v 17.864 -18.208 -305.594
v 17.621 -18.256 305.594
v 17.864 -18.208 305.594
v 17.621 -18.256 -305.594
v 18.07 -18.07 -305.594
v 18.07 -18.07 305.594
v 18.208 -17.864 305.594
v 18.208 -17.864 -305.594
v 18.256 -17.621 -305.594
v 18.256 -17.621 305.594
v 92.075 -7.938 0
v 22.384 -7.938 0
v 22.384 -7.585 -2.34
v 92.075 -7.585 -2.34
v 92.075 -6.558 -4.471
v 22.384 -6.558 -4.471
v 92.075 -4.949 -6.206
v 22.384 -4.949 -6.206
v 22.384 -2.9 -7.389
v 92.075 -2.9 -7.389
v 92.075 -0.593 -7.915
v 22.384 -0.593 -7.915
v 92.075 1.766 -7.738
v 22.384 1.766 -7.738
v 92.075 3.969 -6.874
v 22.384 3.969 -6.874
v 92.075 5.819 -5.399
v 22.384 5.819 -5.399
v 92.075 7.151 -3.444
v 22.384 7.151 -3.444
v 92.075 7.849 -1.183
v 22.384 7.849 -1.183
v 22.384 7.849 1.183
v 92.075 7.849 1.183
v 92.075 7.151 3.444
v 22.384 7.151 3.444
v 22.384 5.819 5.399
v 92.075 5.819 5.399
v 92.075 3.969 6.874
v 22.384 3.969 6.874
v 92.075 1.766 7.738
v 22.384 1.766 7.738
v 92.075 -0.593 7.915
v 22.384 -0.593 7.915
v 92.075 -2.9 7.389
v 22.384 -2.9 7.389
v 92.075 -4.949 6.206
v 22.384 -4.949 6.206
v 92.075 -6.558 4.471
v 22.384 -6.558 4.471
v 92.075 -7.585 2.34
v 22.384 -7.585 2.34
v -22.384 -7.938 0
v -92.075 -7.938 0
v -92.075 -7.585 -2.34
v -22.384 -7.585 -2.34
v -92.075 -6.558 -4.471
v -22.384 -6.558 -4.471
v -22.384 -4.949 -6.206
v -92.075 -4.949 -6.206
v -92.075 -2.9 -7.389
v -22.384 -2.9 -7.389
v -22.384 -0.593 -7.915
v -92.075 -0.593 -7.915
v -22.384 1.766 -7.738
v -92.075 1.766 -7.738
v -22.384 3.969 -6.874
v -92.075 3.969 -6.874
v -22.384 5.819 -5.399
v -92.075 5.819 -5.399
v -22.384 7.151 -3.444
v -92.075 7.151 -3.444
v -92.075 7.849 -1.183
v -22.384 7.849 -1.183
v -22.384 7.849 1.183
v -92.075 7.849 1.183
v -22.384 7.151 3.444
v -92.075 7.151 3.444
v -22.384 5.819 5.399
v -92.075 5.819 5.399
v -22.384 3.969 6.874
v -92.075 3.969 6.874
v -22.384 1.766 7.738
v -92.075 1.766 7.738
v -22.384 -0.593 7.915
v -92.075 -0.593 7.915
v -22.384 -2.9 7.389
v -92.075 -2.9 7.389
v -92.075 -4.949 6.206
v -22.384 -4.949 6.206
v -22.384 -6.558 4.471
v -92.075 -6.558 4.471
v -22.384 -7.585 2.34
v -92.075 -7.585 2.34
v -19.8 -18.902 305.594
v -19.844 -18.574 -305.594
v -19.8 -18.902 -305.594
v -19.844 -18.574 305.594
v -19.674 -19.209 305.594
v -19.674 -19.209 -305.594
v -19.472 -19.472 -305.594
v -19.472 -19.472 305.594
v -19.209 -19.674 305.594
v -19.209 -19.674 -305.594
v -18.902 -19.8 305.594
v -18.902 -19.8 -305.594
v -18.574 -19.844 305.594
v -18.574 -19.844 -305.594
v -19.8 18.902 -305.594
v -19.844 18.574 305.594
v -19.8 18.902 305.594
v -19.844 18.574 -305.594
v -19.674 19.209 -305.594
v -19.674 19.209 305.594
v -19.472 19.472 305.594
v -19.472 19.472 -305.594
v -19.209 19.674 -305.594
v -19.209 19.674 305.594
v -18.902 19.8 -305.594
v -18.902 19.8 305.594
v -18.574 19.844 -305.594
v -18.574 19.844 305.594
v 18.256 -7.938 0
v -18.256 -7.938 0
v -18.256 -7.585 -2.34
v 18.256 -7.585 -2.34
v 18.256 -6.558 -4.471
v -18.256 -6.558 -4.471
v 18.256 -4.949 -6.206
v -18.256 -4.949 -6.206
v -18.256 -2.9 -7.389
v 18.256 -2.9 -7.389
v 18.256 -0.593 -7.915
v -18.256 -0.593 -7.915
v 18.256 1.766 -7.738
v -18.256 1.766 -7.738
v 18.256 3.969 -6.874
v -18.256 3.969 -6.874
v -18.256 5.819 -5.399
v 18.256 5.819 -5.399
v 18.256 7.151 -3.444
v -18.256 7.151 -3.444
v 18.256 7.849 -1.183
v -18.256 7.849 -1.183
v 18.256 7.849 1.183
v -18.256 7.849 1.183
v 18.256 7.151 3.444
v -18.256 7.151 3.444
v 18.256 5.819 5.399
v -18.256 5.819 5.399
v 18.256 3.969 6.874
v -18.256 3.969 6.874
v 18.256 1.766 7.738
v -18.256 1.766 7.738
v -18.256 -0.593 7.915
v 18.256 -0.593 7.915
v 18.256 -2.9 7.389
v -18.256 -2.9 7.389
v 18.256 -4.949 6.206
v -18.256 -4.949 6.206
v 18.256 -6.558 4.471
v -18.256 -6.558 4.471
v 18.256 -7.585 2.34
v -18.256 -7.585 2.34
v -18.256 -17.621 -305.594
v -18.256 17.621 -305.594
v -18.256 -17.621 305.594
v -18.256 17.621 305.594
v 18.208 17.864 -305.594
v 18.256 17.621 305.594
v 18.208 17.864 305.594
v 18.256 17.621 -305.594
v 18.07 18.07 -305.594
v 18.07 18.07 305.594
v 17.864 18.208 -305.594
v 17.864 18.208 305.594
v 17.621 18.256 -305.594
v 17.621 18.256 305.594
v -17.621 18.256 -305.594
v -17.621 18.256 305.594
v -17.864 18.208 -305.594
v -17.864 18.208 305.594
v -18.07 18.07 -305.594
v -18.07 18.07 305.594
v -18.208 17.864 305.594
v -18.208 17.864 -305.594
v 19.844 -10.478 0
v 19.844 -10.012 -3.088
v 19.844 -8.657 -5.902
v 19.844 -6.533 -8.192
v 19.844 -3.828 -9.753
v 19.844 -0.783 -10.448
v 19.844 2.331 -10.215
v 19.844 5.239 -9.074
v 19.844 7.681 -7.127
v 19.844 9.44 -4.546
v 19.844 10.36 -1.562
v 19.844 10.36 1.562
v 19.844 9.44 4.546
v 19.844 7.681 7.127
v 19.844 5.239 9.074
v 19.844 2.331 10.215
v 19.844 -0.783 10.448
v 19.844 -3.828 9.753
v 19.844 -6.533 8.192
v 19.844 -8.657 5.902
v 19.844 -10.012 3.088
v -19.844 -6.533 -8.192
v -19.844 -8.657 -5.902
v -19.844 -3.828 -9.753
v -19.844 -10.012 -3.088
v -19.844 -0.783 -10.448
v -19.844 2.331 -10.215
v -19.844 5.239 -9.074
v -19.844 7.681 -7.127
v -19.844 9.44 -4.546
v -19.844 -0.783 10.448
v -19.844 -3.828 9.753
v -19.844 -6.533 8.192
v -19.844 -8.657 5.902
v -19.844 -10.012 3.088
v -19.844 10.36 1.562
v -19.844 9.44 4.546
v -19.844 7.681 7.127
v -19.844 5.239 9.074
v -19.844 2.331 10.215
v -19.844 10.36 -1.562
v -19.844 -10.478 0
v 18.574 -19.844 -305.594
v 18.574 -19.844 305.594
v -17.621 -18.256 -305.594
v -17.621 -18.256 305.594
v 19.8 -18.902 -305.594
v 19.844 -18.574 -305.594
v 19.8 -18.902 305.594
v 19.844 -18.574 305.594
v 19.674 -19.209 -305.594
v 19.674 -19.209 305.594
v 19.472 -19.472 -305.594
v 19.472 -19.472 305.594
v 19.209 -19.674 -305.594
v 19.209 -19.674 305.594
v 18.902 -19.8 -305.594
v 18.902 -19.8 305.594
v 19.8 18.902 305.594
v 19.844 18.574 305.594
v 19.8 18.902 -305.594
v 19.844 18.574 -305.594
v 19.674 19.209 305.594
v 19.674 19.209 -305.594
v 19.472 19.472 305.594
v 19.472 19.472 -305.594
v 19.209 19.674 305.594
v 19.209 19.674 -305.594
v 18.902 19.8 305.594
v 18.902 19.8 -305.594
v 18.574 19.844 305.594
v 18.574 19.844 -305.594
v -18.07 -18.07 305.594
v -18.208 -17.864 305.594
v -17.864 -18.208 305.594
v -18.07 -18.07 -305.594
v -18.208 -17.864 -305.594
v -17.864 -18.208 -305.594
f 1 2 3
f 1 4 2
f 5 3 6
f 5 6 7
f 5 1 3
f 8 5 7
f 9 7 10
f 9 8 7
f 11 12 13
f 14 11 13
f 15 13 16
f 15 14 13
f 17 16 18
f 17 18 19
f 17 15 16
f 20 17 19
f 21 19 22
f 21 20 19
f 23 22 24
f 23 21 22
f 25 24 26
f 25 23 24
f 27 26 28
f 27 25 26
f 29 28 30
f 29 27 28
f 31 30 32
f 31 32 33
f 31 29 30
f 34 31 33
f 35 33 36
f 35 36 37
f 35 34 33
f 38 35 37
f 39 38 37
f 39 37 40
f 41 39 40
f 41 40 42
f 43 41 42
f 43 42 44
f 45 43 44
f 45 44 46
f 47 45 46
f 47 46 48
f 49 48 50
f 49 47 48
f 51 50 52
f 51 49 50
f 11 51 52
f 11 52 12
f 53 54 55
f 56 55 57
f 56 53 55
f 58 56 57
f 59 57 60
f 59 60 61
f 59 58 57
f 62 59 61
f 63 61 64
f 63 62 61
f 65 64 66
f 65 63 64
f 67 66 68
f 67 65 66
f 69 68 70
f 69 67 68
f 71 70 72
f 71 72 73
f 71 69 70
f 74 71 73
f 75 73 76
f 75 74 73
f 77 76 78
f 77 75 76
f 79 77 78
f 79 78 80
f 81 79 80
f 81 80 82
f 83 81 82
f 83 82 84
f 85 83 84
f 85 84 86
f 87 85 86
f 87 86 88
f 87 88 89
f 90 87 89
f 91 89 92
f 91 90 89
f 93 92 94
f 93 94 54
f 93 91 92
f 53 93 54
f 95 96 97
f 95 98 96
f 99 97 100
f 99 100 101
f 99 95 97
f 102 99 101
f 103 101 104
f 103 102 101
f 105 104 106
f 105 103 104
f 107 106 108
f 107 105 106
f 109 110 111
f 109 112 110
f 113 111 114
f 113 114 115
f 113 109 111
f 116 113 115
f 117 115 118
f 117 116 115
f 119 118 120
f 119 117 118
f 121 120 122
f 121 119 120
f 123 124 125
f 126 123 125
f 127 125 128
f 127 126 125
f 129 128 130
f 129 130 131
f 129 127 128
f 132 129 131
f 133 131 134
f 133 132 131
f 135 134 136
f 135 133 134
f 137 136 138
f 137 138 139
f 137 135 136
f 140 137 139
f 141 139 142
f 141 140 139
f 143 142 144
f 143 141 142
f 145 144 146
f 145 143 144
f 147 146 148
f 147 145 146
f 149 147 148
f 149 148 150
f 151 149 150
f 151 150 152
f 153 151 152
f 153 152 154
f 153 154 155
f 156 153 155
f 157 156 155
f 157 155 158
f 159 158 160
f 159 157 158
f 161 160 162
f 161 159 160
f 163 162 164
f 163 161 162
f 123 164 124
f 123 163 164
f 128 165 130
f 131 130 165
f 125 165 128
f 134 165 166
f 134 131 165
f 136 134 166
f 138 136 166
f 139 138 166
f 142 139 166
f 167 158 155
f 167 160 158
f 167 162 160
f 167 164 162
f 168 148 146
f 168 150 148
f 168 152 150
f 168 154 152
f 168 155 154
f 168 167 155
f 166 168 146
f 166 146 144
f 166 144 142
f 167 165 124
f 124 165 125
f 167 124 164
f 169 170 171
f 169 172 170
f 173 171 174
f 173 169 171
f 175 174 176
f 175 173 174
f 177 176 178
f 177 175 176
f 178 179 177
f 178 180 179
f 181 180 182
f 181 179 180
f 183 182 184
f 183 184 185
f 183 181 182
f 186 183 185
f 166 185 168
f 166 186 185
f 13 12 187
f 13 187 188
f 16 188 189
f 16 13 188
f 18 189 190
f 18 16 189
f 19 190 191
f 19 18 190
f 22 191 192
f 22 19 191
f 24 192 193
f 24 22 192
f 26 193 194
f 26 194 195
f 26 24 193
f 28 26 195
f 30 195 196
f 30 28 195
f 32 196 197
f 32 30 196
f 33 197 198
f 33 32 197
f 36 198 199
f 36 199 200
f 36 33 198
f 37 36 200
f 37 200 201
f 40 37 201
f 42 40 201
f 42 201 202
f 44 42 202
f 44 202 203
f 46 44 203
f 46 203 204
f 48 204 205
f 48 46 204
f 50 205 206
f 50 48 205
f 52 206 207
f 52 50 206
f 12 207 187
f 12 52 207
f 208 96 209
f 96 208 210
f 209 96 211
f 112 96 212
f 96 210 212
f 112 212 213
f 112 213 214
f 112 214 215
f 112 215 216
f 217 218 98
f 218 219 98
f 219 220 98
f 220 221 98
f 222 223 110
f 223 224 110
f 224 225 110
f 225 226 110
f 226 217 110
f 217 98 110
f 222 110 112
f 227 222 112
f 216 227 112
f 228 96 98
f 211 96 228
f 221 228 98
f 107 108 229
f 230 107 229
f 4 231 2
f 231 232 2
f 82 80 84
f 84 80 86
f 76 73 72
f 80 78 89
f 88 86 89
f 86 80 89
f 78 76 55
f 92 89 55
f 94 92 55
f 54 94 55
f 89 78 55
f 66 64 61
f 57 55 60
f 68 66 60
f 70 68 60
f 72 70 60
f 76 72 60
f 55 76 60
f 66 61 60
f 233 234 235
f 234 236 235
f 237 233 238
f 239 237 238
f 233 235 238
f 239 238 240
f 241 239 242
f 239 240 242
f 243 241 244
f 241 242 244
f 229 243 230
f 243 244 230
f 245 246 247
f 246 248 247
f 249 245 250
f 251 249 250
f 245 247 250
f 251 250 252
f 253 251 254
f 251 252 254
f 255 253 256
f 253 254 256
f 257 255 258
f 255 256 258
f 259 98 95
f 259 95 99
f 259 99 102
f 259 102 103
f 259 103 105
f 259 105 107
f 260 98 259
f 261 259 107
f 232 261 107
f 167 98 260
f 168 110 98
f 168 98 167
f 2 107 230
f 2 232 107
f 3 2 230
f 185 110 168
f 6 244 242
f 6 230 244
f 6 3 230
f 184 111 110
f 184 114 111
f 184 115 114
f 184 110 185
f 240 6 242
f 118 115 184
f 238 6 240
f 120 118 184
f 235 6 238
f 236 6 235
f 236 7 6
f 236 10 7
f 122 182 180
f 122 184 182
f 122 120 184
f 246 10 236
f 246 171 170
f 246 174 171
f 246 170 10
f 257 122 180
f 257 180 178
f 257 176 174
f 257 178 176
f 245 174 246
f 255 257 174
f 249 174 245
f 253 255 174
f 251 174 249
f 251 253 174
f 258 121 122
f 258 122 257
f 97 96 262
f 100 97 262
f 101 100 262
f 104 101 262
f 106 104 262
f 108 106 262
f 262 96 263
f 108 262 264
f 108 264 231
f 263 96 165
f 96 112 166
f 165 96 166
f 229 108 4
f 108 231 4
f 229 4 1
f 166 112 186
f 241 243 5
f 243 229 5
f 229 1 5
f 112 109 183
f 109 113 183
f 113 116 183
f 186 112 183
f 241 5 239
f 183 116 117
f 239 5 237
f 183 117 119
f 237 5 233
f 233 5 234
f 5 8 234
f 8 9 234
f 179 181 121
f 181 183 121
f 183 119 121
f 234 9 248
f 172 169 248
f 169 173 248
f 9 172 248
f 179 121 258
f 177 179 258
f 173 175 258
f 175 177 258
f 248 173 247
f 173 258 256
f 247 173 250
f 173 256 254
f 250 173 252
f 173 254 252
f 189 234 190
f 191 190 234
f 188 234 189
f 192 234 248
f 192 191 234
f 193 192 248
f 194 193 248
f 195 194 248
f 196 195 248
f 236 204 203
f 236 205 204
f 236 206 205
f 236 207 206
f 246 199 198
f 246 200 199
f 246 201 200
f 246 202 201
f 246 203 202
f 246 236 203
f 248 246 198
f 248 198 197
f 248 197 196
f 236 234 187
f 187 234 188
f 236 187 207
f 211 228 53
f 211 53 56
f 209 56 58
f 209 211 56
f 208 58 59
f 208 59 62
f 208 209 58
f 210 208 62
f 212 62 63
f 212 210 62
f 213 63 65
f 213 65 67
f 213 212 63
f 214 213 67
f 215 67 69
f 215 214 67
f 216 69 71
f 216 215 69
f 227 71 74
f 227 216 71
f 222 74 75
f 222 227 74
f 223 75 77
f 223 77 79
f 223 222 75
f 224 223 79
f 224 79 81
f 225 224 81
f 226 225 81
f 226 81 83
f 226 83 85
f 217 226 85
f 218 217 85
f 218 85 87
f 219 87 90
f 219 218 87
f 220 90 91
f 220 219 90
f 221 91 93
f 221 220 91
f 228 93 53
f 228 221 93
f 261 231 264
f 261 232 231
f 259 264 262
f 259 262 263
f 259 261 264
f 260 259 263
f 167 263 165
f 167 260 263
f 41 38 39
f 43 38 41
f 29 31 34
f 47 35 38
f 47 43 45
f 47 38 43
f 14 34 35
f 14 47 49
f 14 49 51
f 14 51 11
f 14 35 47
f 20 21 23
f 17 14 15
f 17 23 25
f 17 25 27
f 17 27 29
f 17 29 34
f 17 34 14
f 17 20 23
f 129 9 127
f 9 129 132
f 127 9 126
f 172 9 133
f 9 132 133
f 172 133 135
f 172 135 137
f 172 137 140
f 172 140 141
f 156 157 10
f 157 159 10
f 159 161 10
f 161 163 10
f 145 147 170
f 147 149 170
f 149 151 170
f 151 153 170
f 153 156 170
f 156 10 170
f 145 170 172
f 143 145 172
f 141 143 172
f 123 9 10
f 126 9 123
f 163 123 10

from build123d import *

# Parameters (mm, degrees)
SKETCH1_W           = 39.6875
SKETCH1_H           = 39.6875
SKETCH1_W_2         = 36.5125
SKETCH1_H_2         = 36.5125
BOSS_EXTRUDE1_DEPTH = 305.59375
FILLET1_R           = 1.27
FILLET2_R           = 0.635
SKETCH2_R           = 7.9375
BOSS_EXTRUDE2_DEPTH = 92.075
CHAMFER1_SIZE       = 2.54


with BuildPart() as part:
    # Sketch1 → Boss-Extrude1 (new, symmetric)
    with BuildSketch(Plane.XY):
        Rectangle(SKETCH1_W, SKETCH1_H)
        Rectangle(SKETCH1_W_2, SKETCH1_H_2, mode=Mode.SUBTRACT)
    extrude(amount=BOSS_EXTRUDE1_DEPTH, both=True)

    # Fillet1
    fillet1_edges = [part.edges().sort_by_distance(p)[0] for p in [
        (-19.84375, 19.84375, 0),
        (19.84375, 19.84375, 0),
        (19.84375, -19.84375, 0),
        (-19.84375, -19.84375, 0),
    ]]
    fillet(fillet1_edges, radius=FILLET1_R)

    # Fillet2
    fillet2_edges = [part.edges().sort_by_distance(p)[0] for p in [
        (18.25625, -18.25625, 0),
        (18.25625, 18.25625, 0),
        (-18.25625, 18.25625, 0),
        (-18.25625, -18.25625, 0),
    ]]
    fillet(fillet2_edges, radius=FILLET2_R)

    # Sketch2 → Boss-Extrude2 (add, symmetric)
    with BuildSketch(Plane(origin=(0, 0, 0), x_dir=(0, 0, -1), z_dir=(1, 0, 0))):
        with Locations(Location((0, 0, 0), (0, 0, 270))):
            Circle(SKETCH2_R)
    extrude(amount=BOSS_EXTRUDE2_DEPTH, both=True)

    # Chamfer1
    chamfer1_edges = [part.edges().sort_by_distance(p)[0] for p in [
        (19.84375, 7.9375, 0),
        (-19.84375, 7.9375, 0),
    ]]
    chamfer(chamfer1_edges, length=CHAMFER1_SIZE)


solid = part.part
